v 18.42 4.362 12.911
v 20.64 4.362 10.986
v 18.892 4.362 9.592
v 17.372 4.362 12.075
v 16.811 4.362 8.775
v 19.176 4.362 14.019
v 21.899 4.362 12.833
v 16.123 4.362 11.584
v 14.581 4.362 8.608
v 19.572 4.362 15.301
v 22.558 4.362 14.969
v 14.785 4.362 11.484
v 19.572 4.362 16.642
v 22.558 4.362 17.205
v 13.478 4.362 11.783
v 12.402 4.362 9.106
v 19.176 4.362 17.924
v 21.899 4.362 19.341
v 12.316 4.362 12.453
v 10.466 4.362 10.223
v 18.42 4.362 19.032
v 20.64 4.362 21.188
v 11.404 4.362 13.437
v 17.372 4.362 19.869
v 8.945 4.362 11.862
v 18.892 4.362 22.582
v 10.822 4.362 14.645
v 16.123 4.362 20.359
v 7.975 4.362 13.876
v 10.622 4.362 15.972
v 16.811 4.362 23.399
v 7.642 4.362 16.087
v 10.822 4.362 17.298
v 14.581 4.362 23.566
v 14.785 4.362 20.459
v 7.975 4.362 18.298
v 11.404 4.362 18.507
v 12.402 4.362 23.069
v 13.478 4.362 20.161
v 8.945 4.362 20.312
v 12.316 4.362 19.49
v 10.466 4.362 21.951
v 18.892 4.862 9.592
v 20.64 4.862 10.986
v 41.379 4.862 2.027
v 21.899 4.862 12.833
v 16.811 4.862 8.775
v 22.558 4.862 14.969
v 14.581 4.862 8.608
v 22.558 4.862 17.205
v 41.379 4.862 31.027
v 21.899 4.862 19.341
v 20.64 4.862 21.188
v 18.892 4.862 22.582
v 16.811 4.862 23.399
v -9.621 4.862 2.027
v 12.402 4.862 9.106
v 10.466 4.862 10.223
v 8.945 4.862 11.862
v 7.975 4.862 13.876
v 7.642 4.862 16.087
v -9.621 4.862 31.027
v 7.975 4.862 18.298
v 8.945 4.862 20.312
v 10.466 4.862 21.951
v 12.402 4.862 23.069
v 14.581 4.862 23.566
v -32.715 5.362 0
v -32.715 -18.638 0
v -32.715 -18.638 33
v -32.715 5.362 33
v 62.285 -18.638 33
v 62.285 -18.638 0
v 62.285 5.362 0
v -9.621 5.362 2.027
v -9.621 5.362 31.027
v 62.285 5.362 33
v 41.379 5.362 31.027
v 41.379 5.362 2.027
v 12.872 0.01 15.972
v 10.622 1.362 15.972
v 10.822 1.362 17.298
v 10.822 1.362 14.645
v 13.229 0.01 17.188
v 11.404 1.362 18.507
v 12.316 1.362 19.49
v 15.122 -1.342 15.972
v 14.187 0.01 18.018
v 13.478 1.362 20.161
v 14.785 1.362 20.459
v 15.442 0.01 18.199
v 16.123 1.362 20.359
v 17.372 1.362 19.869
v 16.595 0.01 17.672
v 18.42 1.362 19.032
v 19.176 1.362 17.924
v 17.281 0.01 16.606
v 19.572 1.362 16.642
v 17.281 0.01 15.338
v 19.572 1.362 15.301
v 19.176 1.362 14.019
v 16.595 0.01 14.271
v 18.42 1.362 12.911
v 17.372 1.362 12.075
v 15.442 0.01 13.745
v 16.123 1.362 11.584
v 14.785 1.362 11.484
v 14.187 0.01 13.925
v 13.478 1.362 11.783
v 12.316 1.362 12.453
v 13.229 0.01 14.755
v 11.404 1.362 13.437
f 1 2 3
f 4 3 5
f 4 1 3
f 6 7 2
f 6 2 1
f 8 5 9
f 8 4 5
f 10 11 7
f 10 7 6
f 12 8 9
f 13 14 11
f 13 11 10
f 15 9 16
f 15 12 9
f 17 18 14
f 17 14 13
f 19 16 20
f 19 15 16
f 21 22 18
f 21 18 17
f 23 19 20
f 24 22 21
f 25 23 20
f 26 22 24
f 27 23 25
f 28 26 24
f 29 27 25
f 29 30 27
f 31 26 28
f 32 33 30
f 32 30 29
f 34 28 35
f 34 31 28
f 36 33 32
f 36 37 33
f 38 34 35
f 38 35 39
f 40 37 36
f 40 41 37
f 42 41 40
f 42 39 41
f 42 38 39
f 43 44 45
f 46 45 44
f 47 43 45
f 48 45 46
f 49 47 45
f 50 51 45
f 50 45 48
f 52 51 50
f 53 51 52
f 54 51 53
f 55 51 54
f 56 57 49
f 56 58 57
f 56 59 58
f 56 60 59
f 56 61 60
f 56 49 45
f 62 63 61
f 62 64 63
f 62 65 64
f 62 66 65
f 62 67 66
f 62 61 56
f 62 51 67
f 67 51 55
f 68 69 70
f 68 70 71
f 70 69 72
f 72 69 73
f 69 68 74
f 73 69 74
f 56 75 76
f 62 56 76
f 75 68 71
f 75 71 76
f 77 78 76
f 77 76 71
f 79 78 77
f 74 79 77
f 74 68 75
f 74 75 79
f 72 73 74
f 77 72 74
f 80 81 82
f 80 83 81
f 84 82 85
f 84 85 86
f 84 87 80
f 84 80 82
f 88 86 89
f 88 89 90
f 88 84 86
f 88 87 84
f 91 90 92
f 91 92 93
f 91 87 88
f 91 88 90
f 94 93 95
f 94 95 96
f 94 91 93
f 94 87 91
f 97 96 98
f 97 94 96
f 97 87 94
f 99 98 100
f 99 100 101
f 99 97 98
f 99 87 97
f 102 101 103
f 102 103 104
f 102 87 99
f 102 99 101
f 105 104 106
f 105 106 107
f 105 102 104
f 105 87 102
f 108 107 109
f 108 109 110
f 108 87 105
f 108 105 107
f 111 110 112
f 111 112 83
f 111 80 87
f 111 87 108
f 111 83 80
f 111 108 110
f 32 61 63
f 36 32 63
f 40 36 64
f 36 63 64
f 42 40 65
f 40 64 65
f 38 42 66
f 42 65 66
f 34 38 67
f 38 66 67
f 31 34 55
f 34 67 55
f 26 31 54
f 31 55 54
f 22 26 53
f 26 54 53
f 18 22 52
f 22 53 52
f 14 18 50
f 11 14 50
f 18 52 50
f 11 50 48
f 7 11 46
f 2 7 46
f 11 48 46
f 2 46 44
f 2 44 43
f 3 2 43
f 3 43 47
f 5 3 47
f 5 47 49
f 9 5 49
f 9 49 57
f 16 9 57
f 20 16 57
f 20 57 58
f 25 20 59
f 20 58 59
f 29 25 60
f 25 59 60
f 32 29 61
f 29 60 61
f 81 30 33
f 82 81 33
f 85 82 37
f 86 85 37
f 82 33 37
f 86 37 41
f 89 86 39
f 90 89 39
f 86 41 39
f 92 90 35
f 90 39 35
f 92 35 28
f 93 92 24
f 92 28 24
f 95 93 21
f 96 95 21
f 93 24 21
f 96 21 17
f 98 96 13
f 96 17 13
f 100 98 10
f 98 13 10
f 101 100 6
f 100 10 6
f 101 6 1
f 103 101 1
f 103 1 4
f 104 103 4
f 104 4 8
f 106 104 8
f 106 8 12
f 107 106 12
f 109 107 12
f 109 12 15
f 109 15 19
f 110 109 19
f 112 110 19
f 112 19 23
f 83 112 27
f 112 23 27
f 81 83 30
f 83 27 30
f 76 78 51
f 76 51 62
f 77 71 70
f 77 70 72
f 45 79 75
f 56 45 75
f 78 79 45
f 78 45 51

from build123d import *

# Parameters (mm, degrees)
SKETCH_W        = 95
SKETCH_H        = 24
PAD_DEPTH       = 33
SKETCH001_W     = 51
SKETCH001_H     = 29
POCKET_DEPTH    = 0.5
SKETCH002_R     = 7.5
POCKET001_DEPTH = 0.5
SKETCH003_R     = 4.5
HOLE_DEPTH      = 3
HOLE_TIPS_R     = 4.5


with BuildPart() as part:
    # Sketch → Pad (new body)
    with BuildSketch(Plane.XY):
        with Locations((14.785113, -6.63841)):
            Rectangle(SKETCH_W, SKETCH_H)
    extrude(amount=PAD_DEPTH)

    # Sketch001 (on Face4 of Pad) → Pocket (cut)
    with BuildSketch(Plane(origin=(0, 5.36159, 0), x_dir=(-1, 0, 0), z_dir=(0, 1, 0))):
        with Locations((-15.879372, 16.52663)):
            Rectangle(SKETCH001_W, SKETCH001_H)
    extrude(amount=-POCKET_DEPTH, mode=Mode.SUBTRACT)

    # Sketch002 (on Face11 of Pocket) → Pocket001 (cut)
    with BuildSketch(Plane(origin=(0, 4.86159, 0), x_dir=(-1, 0, 0), z_dir=(0, 1, 0))):
        with Locations((-15.141794, 16.087093)):
            Circle(SKETCH002_R)
    extrude(amount=-POCKET001_DEPTH, mode=Mode.SUBTRACT)

    # Sketch003 (on Face13 of Pocket001) → Hole (cut)
    with BuildSketch(Plane(origin=(0, 4.36159, 0), x_dir=(-1, 0, 0), z_dir=(0, 1, 0))):
        with Locations((-15.121763, 15.971645)):
            Circle(SKETCH003_R)
    extrude(amount=-HOLE_DEPTH, mode=Mode.SUBTRACT)

    # Hole tips → Hole tip 1 section 0
    with BuildSketch(Plane(origin=(0, 1.36159, 0), x_dir=(-1, 0, 0), z_dir=(0, 1, 0)), mode=Mode.PRIVATE) as hole_tip_1_s0:
        with Locations((-15.121763, 15.971645)):
            Circle(HOLE_TIPS_R)
    loft([hole_tip_1_s0.sketch, Vertex(15.121763, -1.342283, 15.971645)], mode=Mode.SUBTRACT)


solid = part.part
